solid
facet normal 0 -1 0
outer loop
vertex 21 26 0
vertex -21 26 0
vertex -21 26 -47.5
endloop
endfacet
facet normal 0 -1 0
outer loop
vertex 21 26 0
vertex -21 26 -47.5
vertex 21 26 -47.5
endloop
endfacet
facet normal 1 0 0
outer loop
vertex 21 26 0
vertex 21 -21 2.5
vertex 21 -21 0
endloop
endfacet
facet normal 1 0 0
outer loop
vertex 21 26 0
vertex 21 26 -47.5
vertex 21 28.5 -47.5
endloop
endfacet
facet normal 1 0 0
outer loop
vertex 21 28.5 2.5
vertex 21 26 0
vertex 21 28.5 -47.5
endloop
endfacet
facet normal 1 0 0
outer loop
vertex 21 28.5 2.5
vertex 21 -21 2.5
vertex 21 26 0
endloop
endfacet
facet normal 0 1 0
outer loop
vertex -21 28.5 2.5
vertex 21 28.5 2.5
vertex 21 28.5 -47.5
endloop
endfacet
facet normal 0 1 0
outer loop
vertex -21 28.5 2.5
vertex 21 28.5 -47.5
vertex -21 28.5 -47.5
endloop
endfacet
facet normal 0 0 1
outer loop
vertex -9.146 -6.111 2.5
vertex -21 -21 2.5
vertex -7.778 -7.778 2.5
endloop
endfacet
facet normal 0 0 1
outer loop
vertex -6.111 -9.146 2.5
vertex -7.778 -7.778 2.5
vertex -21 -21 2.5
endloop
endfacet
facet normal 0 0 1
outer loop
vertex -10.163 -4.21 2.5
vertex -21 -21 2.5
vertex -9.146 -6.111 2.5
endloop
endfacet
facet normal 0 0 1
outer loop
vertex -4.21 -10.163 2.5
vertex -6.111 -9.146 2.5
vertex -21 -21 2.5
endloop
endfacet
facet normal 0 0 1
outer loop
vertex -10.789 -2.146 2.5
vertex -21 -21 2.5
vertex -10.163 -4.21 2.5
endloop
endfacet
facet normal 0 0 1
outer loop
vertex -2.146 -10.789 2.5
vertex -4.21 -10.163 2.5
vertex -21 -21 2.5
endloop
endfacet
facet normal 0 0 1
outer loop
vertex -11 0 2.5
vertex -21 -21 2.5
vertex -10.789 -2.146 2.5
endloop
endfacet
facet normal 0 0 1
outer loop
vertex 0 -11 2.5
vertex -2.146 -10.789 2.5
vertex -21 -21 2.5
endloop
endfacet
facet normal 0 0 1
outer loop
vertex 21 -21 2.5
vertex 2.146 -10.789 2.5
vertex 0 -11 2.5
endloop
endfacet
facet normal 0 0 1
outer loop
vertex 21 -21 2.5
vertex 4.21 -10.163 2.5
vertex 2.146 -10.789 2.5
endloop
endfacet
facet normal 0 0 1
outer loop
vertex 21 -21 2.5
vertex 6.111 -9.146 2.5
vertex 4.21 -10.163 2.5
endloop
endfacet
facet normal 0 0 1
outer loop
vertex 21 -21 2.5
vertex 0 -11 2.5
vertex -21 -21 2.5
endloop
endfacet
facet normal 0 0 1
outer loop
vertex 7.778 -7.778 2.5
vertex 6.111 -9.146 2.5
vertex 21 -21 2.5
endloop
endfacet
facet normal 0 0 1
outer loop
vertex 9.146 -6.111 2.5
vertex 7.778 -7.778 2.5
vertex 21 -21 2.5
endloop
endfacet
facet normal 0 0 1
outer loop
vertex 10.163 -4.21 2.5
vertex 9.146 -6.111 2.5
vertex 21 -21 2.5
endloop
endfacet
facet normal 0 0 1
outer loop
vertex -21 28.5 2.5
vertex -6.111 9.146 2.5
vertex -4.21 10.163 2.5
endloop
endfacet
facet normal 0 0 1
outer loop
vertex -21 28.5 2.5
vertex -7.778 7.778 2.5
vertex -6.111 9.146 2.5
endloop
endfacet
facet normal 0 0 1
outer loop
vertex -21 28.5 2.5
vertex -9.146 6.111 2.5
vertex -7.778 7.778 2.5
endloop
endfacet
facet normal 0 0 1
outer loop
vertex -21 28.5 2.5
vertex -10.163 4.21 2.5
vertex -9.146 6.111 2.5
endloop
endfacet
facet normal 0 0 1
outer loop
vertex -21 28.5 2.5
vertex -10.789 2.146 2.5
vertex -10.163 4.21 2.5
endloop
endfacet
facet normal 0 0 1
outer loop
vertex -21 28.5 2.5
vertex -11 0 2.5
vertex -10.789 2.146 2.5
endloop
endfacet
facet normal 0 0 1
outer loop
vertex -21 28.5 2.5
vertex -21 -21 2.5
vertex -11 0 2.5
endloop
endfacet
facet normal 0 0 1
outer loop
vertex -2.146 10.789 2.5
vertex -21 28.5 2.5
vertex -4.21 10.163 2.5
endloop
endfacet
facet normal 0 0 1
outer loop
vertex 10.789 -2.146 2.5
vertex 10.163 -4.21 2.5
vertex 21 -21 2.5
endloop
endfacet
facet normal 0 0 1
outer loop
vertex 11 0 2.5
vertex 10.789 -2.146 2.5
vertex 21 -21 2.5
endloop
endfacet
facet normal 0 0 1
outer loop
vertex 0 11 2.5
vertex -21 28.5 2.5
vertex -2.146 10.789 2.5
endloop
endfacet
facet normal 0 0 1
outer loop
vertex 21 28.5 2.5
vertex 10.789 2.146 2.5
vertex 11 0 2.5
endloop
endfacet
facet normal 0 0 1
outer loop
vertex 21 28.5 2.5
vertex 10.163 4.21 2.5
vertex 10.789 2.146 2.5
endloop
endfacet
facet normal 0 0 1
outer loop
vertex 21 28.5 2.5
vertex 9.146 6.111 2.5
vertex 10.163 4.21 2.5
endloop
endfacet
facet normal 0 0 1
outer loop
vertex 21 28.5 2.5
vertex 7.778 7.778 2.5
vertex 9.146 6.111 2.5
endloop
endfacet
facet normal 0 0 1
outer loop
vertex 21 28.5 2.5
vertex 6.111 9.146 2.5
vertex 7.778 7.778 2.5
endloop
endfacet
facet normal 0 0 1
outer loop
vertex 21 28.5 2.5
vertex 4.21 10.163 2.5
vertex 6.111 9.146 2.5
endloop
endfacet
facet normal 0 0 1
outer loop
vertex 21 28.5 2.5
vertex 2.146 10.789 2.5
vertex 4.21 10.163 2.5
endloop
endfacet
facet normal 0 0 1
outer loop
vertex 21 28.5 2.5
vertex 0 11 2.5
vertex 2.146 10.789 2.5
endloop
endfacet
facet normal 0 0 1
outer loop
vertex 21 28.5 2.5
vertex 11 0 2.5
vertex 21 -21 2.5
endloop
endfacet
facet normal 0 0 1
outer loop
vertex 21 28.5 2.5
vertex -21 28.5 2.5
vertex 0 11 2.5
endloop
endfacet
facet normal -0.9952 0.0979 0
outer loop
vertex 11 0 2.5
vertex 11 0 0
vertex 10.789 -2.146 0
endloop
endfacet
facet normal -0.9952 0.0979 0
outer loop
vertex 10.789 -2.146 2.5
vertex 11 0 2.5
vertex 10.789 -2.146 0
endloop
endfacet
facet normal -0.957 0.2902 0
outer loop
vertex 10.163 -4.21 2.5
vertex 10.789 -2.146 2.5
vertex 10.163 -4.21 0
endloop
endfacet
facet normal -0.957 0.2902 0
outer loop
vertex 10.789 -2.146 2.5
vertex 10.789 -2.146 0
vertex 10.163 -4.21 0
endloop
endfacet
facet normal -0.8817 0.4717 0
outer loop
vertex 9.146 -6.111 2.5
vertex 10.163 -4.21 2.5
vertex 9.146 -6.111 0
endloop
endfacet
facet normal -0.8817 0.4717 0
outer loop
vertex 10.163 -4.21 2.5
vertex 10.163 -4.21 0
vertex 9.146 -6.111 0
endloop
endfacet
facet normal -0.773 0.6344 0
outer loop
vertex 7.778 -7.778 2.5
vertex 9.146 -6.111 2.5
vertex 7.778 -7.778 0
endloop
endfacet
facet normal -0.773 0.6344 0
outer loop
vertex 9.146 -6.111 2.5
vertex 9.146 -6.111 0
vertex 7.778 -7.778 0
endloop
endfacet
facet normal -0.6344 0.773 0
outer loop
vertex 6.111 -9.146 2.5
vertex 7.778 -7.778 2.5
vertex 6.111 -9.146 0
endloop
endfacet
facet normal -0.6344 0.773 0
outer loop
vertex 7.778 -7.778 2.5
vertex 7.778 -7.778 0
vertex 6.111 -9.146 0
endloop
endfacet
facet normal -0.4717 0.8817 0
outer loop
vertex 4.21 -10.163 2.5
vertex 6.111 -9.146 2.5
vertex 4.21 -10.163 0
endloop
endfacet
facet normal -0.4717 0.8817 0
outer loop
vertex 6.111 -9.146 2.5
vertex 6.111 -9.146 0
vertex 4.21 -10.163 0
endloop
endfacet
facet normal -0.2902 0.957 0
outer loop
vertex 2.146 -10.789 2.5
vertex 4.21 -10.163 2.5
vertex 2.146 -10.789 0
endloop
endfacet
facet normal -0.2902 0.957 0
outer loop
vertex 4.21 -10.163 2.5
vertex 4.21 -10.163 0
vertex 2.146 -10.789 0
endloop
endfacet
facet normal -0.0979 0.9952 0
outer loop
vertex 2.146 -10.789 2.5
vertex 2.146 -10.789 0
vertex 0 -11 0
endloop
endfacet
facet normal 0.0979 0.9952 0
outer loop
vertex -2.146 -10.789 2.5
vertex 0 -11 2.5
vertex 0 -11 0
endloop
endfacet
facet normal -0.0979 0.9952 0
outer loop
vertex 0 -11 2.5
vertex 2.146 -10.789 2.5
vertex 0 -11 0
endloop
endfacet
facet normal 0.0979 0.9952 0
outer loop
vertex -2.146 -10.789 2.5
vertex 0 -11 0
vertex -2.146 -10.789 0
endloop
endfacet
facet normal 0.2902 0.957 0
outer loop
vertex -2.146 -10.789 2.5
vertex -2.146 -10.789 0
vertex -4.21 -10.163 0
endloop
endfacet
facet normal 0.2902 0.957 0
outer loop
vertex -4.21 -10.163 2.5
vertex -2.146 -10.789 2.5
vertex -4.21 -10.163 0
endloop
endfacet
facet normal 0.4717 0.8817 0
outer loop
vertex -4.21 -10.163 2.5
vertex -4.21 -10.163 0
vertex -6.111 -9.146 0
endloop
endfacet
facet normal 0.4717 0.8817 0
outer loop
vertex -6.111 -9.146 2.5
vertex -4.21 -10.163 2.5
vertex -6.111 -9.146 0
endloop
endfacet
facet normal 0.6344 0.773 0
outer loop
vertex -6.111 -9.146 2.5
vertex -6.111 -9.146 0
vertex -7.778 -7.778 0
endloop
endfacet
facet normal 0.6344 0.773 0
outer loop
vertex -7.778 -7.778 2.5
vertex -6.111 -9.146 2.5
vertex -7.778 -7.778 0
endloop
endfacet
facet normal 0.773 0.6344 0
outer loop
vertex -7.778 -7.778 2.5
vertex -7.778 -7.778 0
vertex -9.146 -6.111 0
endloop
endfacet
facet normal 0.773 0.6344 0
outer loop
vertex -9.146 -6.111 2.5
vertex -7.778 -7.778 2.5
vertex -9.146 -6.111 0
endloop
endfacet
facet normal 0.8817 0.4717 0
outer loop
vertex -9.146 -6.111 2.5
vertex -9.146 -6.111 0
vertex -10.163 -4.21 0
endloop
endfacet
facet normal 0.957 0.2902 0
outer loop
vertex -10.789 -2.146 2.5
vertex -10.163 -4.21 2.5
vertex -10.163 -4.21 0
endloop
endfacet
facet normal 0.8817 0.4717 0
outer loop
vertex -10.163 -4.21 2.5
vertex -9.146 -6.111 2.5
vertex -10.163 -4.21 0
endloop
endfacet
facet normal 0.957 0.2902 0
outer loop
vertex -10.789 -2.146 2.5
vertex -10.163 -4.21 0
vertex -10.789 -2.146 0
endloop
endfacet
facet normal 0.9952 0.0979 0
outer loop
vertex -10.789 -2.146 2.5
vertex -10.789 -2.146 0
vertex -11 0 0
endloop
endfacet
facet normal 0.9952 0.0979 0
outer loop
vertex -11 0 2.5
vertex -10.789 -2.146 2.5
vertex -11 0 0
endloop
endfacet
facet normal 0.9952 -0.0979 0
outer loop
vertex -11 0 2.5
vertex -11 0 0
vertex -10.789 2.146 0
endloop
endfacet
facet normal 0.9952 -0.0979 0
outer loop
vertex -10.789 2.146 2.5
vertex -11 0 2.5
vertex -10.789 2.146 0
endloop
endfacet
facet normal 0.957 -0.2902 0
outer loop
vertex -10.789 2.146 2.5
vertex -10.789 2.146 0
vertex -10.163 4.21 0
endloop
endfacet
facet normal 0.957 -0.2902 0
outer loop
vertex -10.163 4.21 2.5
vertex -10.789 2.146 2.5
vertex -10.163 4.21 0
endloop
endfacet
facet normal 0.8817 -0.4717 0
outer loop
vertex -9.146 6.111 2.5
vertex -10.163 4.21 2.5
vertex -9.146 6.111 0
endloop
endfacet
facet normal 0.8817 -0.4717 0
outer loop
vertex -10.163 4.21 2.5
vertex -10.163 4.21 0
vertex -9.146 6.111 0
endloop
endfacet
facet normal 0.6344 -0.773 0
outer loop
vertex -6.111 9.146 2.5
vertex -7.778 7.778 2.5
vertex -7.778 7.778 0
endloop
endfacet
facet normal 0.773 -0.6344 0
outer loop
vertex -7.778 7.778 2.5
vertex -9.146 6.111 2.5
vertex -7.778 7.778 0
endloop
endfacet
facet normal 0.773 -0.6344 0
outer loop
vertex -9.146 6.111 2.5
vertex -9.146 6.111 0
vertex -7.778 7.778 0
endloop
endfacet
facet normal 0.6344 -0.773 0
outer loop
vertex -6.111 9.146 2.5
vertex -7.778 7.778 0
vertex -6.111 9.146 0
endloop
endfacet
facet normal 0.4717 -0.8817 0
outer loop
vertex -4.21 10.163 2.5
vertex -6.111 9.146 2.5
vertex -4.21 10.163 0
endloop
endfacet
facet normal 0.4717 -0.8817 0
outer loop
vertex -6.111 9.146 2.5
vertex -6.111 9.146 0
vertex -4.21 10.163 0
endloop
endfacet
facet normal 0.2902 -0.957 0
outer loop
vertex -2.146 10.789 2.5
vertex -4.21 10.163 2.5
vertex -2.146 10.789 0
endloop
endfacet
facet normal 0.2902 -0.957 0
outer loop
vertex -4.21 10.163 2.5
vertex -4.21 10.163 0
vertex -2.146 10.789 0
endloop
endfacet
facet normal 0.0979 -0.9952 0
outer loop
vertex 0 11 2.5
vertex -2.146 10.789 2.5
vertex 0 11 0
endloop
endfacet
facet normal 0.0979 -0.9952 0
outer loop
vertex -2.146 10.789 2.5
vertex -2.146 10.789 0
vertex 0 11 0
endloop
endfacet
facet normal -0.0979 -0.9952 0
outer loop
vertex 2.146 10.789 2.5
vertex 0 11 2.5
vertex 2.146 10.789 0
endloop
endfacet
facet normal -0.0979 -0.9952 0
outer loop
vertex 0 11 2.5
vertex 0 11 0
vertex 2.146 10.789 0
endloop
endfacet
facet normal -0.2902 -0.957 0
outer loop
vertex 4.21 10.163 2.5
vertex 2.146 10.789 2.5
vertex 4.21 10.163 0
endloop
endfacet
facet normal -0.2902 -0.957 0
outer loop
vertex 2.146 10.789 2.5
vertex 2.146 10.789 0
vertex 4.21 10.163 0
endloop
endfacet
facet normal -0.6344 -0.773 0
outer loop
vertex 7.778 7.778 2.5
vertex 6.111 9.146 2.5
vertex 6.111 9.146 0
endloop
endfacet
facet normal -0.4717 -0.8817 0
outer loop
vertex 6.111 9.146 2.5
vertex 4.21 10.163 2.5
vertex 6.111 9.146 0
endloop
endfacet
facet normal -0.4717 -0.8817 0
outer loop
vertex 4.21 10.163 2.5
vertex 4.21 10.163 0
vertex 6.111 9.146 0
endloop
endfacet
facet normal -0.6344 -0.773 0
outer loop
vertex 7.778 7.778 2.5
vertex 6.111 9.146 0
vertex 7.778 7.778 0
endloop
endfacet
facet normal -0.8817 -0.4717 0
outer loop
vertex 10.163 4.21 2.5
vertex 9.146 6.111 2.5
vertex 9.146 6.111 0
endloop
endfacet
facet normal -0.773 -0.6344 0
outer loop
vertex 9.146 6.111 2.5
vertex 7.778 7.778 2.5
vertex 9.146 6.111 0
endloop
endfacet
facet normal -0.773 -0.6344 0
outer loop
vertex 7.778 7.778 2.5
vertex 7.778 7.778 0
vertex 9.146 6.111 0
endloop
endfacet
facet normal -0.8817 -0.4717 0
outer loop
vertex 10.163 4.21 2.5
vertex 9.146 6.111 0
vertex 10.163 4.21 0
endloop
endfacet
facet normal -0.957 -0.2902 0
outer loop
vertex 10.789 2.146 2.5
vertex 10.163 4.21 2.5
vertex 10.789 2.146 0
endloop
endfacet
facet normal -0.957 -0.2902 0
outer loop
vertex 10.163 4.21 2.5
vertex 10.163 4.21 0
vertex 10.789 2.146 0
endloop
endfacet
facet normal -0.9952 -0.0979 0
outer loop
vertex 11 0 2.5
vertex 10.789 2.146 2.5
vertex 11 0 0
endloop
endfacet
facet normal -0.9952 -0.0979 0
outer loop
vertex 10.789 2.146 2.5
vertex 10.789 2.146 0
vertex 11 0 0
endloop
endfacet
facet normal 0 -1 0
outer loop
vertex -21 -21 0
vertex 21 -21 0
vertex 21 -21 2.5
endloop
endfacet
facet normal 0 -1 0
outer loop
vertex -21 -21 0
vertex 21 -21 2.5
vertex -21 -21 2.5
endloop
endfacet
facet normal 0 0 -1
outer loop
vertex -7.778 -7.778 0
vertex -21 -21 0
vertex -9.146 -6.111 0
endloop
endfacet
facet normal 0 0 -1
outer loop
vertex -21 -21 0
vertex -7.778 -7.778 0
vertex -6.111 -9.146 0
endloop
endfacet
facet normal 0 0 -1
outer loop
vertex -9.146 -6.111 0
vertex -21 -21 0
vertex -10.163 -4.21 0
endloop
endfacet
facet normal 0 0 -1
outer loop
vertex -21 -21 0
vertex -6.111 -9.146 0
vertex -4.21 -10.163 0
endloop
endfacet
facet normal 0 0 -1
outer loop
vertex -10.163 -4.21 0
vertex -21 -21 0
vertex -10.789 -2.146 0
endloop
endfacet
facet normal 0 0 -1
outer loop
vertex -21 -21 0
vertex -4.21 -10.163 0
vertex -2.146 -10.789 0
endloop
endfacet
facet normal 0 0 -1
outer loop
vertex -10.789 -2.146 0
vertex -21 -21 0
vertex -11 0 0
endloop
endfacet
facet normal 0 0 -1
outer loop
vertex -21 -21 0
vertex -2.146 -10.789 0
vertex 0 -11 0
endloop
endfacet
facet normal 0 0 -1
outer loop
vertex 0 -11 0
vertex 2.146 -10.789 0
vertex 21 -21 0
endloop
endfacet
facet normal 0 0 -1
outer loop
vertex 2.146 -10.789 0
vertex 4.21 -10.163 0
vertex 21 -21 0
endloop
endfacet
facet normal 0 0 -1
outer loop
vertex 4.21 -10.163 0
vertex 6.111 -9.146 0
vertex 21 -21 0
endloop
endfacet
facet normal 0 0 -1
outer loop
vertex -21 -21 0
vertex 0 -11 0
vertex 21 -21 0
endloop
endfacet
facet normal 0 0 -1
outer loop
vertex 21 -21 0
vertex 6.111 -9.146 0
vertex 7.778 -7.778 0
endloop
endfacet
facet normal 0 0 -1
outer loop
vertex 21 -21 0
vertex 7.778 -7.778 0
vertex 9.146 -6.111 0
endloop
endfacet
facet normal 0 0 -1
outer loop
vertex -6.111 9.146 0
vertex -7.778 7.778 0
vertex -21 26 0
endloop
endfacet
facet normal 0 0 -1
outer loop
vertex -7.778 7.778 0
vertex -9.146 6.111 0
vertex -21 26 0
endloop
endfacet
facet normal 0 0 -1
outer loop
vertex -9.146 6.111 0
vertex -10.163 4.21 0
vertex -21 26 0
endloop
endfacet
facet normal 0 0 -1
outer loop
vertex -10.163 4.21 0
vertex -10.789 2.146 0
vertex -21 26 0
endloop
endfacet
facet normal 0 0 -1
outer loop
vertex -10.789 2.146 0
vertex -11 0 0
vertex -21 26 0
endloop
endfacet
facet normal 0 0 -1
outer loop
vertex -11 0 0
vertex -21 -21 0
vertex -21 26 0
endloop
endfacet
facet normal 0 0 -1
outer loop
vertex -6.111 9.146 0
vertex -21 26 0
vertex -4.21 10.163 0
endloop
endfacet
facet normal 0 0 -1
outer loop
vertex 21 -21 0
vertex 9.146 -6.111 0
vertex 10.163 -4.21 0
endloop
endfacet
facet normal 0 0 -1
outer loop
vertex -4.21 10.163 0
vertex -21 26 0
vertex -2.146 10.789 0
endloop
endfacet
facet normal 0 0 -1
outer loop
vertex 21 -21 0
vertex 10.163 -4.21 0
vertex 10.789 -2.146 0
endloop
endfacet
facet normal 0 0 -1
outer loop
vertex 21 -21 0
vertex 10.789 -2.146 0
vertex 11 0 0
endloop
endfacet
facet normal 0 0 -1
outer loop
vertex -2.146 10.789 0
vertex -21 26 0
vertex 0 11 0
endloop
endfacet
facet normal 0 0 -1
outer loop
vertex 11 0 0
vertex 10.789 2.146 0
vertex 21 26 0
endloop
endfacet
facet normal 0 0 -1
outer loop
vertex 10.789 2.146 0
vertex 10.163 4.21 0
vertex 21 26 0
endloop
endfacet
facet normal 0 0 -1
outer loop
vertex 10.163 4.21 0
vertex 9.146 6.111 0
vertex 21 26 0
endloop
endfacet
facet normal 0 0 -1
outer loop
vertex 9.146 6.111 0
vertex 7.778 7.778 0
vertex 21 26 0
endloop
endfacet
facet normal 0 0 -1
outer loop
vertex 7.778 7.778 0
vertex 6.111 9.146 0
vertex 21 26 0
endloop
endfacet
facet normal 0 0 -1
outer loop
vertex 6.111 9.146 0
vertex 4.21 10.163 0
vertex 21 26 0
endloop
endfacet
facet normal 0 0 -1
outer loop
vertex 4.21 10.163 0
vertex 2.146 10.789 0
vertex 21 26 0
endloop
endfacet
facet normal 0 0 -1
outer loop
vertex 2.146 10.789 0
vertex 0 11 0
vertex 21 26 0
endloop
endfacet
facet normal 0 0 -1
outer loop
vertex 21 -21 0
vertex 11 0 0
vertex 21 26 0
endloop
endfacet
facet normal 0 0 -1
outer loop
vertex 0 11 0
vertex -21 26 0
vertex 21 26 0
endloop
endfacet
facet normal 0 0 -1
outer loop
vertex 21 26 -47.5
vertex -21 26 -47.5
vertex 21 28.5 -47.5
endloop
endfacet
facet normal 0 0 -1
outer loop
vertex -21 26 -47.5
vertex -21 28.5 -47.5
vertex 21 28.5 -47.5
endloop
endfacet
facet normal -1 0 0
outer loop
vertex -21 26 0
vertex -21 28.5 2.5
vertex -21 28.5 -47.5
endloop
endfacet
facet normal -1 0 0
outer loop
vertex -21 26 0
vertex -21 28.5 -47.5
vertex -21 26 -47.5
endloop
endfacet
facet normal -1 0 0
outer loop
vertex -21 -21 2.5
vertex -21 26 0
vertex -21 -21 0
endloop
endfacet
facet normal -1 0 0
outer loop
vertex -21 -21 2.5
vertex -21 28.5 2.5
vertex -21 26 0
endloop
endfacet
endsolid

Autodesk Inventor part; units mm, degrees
ref_plane "YZ Plane" through (0, 0, 0) normal (1, 0, 0) x (0, 1, 0)
ref_plane "XZ Plane" through (0, 0, 0) normal (0, 1, 0) x (-1, 0, 0)
ref_plane "XY Plane" through (0, 0, 0) normal (0, 0, 1) x (1, 0, 0)
sketch "Sketch1" plane through (0, 0, 0) normal (0, 0, 1) x (1, 0, 0)
  line L0 (-21, 21) -> (21, 21)
  line L1 (21, 21) -> (21, -21)
  line L2 (21, -21) -> (-21, -21)
  line L3 (-21, -21) -> (-21, 21)
  line L4 (-21, 21) -> (21, -21) construction
  line L5 (21, 21) -> (-21, -21) construction
  circle A0 centre (0, 0) radius 11
  dimension "d0" = 42
  dimension "d1" = 42
  dimension "d2" = 22
extrude "Extrusion1" add sketch "Sketch1" along normal blind 2.5
sketch "Sketch2" plane through (-21, 21, 0) normal (0, 1, 0) x (1, 0, 0)
  line L0 (42, 0) -> (0, 0) projected
  line L1 (0, 0) -> (0, -2.5) projected
  line L2 (42, -2.5) -> (0, -2.5) projected
  line L3 (42, 0) -> (42, -2.5) projected
  point P0 (21, 0)
extrude "Extrusion2" add sketch "Sketch2" along normal blind 5
sketch "Sketch3" plane through (0, 0, 2.5) normal (0, 0, 1) x (1, 0, 0)
  line L0 (-21, -21) -> (-21, 26) projected
  line L1 (-21, 26) -> (21, 26)
  line L2 (21, 26) -> (21, 28.5)
  line L3 (21, 28.5) -> (-21, 28.5)
  line L4 (-21, 28.5) -> (-21, 26)
  point P0 (0, 0)
  dimension "d7" = 42
  dimension "d8" = 2.5
extrude "Extrusion3" add sketch "Sketch3" against normal blind 50
properties part number "SOPORTE DE NEMA"
